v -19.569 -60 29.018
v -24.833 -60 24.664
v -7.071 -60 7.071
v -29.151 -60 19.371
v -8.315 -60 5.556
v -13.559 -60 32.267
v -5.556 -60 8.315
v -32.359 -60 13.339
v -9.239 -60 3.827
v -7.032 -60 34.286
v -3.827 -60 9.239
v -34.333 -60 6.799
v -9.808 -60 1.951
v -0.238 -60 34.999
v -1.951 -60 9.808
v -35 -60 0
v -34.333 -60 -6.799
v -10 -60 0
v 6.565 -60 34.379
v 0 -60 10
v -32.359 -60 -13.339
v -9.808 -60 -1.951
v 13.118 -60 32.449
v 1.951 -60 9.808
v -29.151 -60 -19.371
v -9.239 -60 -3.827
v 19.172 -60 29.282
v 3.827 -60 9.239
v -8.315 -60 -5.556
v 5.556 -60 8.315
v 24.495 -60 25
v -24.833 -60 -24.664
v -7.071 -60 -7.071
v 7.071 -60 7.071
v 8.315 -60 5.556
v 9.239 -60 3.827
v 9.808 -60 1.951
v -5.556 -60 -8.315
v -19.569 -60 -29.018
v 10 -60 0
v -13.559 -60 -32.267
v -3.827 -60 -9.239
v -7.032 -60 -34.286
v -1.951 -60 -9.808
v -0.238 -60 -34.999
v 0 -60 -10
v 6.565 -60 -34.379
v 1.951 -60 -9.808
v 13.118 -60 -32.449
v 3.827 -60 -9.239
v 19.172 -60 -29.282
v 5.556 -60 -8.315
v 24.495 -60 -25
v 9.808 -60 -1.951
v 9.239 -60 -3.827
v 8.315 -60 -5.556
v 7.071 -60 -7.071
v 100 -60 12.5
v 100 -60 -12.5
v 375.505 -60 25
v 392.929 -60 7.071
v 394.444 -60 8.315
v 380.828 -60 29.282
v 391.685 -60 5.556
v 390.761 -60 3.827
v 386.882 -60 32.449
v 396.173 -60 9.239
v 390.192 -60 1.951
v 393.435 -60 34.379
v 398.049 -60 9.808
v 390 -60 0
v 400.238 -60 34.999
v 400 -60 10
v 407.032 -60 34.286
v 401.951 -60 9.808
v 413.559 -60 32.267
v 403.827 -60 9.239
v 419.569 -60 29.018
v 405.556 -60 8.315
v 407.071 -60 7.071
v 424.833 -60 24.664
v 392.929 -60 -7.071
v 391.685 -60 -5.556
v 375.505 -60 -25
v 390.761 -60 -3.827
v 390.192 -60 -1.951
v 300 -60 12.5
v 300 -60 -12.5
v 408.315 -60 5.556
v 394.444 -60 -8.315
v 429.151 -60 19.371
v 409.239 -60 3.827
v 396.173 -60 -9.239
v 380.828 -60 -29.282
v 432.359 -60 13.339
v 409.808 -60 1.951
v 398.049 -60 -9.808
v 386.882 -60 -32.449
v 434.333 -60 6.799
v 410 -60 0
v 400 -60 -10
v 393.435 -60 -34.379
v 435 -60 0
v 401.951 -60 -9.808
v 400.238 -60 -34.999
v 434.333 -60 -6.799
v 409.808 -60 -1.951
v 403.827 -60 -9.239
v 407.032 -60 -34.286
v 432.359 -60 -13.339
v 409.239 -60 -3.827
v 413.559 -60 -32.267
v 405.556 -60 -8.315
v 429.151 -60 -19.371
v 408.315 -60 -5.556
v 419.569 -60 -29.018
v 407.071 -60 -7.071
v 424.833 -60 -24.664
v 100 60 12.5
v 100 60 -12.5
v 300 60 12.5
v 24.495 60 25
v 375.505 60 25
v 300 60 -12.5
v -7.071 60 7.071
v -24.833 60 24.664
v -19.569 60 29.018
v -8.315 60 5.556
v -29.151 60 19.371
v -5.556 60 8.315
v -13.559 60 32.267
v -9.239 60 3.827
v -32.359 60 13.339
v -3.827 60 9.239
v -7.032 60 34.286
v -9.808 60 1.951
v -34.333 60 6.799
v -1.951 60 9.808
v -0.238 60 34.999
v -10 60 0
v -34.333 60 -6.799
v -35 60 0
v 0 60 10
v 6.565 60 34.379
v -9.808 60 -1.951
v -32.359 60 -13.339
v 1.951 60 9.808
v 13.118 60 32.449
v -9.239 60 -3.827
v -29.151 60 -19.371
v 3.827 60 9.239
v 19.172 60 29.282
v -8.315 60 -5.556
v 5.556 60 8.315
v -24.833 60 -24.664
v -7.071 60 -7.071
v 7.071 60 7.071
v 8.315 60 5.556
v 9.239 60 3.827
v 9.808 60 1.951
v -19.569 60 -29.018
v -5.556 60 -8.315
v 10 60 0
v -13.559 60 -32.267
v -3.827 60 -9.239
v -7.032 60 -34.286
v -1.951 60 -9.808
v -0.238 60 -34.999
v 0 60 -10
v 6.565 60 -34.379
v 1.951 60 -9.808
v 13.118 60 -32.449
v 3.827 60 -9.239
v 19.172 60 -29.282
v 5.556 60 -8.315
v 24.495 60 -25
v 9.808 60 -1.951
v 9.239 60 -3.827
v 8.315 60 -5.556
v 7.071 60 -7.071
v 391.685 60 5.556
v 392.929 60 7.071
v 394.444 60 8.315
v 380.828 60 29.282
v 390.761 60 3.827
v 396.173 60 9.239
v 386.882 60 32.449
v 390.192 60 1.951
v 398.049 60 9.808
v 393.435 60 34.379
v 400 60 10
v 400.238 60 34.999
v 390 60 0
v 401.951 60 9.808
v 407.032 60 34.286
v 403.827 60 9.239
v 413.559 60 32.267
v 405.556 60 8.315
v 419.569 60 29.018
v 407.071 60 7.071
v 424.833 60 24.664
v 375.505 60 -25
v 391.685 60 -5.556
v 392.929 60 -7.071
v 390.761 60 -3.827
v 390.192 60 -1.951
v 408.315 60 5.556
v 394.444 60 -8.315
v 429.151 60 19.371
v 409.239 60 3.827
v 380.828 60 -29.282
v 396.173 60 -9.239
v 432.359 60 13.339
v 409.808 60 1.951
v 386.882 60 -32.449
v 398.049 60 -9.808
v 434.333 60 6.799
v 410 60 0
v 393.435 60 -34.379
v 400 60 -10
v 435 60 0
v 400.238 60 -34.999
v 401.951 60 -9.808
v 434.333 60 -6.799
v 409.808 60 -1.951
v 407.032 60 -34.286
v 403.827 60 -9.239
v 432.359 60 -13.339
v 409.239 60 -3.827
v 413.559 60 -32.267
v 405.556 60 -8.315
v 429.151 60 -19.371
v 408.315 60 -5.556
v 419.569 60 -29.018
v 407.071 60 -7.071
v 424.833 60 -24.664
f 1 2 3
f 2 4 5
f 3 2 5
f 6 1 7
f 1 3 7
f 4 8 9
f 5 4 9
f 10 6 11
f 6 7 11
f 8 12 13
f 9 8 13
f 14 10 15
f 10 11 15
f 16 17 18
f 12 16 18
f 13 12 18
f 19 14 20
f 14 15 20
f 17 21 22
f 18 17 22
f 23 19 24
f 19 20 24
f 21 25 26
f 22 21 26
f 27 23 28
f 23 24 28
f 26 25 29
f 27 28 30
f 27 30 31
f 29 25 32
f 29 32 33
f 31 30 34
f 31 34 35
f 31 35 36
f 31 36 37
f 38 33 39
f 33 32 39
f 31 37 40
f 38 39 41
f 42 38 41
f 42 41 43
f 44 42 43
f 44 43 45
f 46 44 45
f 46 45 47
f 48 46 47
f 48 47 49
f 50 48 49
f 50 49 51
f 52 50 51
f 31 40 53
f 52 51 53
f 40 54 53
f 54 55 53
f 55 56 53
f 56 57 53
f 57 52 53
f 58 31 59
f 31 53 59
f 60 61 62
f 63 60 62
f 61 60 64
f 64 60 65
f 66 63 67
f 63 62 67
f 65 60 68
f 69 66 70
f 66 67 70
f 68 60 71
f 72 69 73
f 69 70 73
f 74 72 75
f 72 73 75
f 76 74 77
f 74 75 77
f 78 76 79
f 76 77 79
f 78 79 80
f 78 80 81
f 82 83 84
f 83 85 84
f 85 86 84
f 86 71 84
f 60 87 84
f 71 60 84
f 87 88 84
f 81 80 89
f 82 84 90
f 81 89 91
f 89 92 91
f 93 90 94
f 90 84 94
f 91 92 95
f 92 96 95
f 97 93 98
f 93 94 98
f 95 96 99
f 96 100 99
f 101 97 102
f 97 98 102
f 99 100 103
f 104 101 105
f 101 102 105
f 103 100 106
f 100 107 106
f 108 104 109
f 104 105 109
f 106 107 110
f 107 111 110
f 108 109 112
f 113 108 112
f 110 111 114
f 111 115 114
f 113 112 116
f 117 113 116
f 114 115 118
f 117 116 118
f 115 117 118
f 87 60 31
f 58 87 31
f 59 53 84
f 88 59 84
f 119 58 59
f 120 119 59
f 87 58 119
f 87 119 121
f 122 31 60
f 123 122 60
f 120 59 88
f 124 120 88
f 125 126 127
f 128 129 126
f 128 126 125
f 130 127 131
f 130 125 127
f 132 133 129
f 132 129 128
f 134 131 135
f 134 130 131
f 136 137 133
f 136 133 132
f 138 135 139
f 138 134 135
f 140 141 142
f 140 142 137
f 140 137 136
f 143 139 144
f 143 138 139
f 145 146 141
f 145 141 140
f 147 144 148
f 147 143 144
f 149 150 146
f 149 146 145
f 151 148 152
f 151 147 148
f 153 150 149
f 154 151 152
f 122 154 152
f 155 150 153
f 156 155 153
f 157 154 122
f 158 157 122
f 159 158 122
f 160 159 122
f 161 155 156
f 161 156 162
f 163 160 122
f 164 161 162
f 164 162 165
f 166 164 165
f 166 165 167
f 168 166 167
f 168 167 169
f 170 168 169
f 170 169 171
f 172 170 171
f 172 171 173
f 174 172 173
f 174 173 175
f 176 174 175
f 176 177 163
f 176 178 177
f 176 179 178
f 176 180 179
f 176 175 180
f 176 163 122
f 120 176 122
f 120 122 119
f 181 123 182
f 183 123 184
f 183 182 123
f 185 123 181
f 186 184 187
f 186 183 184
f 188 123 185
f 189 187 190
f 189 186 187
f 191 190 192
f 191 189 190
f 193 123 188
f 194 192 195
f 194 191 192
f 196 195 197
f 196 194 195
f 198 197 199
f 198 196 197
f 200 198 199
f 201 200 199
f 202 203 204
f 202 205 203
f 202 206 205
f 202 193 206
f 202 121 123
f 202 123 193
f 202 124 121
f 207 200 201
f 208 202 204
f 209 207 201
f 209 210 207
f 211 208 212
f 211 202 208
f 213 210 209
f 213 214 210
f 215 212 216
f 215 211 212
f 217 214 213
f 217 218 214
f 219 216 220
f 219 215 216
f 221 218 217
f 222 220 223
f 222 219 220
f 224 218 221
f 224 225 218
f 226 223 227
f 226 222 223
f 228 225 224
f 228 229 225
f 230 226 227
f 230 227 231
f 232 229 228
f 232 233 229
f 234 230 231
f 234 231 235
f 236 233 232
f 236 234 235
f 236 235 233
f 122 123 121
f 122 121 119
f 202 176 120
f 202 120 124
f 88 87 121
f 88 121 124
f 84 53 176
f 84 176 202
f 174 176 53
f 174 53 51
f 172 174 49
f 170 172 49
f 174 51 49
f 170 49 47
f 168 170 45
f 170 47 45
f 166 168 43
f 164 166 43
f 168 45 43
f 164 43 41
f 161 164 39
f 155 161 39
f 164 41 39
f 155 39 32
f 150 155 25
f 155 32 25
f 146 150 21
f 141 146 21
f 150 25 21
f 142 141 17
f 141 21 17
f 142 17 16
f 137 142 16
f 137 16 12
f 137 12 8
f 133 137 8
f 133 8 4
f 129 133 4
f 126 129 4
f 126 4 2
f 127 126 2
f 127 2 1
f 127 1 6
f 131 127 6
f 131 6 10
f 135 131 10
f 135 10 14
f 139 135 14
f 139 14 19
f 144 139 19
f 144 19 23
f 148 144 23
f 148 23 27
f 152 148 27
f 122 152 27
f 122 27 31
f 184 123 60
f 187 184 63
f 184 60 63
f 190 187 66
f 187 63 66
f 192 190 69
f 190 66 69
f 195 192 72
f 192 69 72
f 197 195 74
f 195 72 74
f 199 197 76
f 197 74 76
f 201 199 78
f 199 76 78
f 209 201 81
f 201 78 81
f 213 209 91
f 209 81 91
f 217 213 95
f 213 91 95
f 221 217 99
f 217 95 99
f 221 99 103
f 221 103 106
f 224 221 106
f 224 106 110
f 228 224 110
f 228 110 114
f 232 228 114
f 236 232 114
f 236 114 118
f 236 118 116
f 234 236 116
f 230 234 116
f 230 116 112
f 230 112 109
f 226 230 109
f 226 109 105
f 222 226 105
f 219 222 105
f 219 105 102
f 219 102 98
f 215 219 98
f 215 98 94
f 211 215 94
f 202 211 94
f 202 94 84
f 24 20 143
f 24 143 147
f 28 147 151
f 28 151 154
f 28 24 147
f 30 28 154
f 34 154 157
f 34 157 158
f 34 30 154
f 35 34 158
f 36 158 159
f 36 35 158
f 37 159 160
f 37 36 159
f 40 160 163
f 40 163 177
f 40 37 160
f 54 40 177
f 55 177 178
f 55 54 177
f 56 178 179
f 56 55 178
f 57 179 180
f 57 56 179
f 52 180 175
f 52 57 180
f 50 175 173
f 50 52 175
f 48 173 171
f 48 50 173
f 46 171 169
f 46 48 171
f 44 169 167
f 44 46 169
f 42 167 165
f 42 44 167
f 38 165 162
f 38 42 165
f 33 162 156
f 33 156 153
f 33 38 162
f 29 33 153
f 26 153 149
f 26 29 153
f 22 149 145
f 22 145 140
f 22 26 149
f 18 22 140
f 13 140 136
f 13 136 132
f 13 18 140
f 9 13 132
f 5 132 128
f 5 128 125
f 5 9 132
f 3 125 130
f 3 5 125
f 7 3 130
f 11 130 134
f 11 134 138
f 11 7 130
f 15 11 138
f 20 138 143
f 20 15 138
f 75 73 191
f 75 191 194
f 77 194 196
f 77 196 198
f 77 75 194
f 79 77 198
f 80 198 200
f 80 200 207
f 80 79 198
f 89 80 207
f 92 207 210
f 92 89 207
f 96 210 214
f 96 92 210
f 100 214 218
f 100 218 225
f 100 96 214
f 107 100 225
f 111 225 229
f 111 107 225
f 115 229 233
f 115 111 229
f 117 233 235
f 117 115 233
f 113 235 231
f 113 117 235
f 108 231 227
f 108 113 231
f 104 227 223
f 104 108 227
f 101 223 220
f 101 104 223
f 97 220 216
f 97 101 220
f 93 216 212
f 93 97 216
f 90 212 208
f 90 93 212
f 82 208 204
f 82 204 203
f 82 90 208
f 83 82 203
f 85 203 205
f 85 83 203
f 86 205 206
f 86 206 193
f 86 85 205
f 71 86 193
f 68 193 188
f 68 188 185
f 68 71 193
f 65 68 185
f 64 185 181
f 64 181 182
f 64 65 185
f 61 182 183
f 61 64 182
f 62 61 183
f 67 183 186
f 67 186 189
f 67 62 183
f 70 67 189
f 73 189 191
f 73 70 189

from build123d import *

# Parameters (mm, degrees)
BOSS_EXTRUDE1_DEPTH      = 60
BOSS_EXTRUDE1_DEPTH_BACK = 60
SKETCH1_W                = 400
SKETCH1_H                = 50
BOSS_EXTRUDE2_DEPTH      = 60
BOSS_EXTRUDE2_DEPTH_BACK = 60
SKETCH2_R                = 35
CUT_EXTRUDE1_DEPTH       = 60
CUT_EXTRUDE1_DEPTH_BACK  = 60
SKETCH3_R                = 10
CUT_EXTRUDE2_DEPTH       = 60
CUT_EXTRUDE2_DEPTH_BACK  = 60
SKETCH4_W                = 200
SKETCH4_H                = 25


with BuildPart() as part:
    # Sketch1 → Boss-Extrude1 (new, two sides: drawn at the far end of the back side and taken through both)
    with BuildSketch(Plane(origin=(0, 0, 0), x_dir=(1, 0, 0), z_dir=(0, 1, 0)).offset(-BOSS_EXTRUDE1_DEPTH_BACK)):
        with Locations((200, 0)):
            Rectangle(SKETCH1_W, SKETCH1_H)
    extrude(amount=BOSS_EXTRUDE1_DEPTH + BOSS_EXTRUDE1_DEPTH_BACK)

    # Sketch2 → Boss-Extrude2 (add, two sides: drawn at the far end of the back side and taken through both)
    with BuildSketch(Plane(origin=(0, 0, 0), x_dir=(1, 0, 0), z_dir=(0, 1, 0)).offset(-BOSS_EXTRUDE2_DEPTH_BACK)):
        Circle(SKETCH2_R)
        with Locations((400, 0)):
            Circle(SKETCH2_R)
    extrude(amount=BOSS_EXTRUDE2_DEPTH + BOSS_EXTRUDE2_DEPTH_BACK)

    # Sketch3 → Cut-Extrude1 (cut, two sides: drawn at the far end of the back side and taken through both)
    with BuildSketch(Plane(origin=(0, 0, 0), x_dir=(1, 0, 0), z_dir=(0, 1, 0)).offset(-CUT_EXTRUDE1_DEPTH_BACK)):
        Circle(SKETCH3_R)
        with Locations((400, 0)):
            Circle(SKETCH3_R)
    extrude(amount=CUT_EXTRUDE1_DEPTH + CUT_EXTRUDE1_DEPTH_BACK, mode=Mode.SUBTRACT)

    # Sketch4 → Cut-Extrude2 (cut, two sides: drawn at the far end of the back side and taken through both)
    with BuildSketch(Plane(origin=(0, 0, 0), x_dir=(1, 0, 0), z_dir=(0, 1, 0)).offset(-CUT_EXTRUDE2_DEPTH_BACK)):
        with Locations((200, 0)):
            Rectangle(SKETCH4_W, SKETCH4_H)
    extrude(amount=CUT_EXTRUDE2_DEPTH + CUT_EXTRUDE2_DEPTH_BACK, mode=Mode.SUBTRACT)


solid = part.part
